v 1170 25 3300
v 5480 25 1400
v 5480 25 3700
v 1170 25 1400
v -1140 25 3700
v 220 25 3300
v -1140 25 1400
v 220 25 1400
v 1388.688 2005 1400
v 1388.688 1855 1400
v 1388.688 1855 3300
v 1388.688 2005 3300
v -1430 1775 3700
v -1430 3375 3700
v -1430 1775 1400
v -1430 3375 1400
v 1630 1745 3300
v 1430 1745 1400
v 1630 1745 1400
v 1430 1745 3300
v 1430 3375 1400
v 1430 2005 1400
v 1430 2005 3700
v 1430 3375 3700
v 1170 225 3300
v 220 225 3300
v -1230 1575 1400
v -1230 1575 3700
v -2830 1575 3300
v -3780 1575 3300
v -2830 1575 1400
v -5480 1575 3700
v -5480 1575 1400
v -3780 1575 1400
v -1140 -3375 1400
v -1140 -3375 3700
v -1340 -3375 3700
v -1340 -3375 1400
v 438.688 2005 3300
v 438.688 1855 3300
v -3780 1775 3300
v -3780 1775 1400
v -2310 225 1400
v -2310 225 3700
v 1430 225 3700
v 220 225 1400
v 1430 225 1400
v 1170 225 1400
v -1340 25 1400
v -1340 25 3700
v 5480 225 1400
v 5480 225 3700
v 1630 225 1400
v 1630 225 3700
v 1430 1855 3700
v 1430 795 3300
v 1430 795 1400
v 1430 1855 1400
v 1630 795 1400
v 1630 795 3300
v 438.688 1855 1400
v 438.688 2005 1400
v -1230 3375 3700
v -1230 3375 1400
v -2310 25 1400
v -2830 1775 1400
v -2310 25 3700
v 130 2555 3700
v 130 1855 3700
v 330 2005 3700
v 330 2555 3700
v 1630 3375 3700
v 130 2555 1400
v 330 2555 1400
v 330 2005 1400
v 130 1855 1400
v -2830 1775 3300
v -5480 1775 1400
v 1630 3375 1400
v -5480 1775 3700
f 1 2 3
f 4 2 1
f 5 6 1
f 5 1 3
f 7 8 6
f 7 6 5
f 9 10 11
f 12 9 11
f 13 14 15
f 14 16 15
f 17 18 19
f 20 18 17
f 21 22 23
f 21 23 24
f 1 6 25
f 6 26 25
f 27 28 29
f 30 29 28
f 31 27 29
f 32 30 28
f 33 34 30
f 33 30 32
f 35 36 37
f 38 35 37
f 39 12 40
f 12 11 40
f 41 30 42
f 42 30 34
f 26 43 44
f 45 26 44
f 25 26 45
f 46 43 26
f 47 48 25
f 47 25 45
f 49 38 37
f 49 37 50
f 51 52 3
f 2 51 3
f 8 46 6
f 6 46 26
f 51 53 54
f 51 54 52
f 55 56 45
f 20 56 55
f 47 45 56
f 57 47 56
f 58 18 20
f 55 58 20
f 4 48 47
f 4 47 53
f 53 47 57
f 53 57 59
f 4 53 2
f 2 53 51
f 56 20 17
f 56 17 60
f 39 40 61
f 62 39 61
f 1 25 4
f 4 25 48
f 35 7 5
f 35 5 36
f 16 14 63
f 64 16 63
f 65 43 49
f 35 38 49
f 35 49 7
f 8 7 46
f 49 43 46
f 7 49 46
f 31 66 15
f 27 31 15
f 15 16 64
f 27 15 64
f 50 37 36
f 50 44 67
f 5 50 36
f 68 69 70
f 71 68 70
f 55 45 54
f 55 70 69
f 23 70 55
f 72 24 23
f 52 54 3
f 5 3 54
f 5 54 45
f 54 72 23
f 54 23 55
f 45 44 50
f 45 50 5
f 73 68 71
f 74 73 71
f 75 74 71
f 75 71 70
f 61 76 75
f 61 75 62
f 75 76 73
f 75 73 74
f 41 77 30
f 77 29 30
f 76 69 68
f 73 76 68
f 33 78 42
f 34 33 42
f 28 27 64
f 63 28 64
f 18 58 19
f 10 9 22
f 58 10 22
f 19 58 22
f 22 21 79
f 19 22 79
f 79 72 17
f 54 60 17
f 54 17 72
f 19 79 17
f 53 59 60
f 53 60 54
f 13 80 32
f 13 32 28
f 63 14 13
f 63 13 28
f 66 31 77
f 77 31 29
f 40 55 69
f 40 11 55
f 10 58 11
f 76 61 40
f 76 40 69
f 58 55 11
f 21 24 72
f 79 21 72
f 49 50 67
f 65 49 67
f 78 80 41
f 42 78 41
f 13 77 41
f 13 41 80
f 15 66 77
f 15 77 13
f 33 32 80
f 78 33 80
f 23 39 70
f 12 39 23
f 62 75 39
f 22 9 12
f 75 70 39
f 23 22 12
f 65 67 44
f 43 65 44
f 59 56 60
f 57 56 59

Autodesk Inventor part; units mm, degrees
ref_plane "YZ Plane" through (0, 0, 0) normal (1, 0, 0) x (0, 1, 0)
ref_plane "XZ Plane" through (0, 0, 0) normal (0, 1, 0) x (-1, 0, 0)
ref_plane "Arbeitsebene1" through (0, 0, 1400) normal (0, 0, 1) x (1, 0, 0)
sketch "Skizze1" plane through (0, 0, 1400) normal (0, 0, 1) x (1, 0, 0)
  line L0 (5480, 3375) -> (5480, -3375) projected
  line L1 (5480, -3375) -> (-4000, -3375) projected
  line L2 (-4000, -3375) -> (-4000, -2075) projected
  line L3 (-4000, -2075) -> (-5480, -2075) projected
  line L4 (-5480, -2075) -> (-5480, 3375) projected
  line L5 (-5480, 3375) -> (5480, 3375) projected
  line L6 (-5480, -3575) -> (-5480, -2275) projected
  line L7 (-5480, -2275) -> (-4200, -2275) projected
  line L8 (-4200, -2275) -> (-4200, -3575) projected
  line L9 (-4200, -3575) -> (5680, -3575) projected
  line L10 (5680, -3575) -> (5680, 3575) projected
  line L11 (5680, 3575) -> (-5680, 3575) projected
  line L12 (-5680, 3575) -> (-5680, -3575) projected
  line L13 (-5680, -3575) -> (-5480, -3575) projected
  line L14 (-1140, -3375) -> (-1340, -3375)
  line L15 (-1340, -3375) -> (-1340, 25)
  line L16 (-1140, 25) -> (-1140, -3375)
  line L17 (-2310, 25) -> (-2310, 225)
  line L18 (5480, 225) -> (5480, 25)
  line L19 (-5480, 1775) -> (-1430, 1775)
  line L20 (-1230, 1575) -> (-5480, 1575)
  line L21 (-5480, 1575) -> (-5480, 1775)
  line L22 (-1230, 1575) -> (-1230, 3375)
  line L23 (-1430, 3375) -> (-1430, 1775)
  line L24 (1430, 3375) -> (1630, 3375)
  line L25 (1630, 3375) -> (1630, 225)
  line L26 (1430, 225) -> (1430, 3375)
  line L27 (5480, 25) -> (-1140, 25)
  line L28 (-1340, 25) -> (-2310, 25)
  line L29 (-2310, 225) -> (1430, 225)
  line L30 (1630, 225) -> (5480, 225)
  line L31 (-1430, 3375) -> (-1230, 3375)
  line L32 (1430, 1855) -> (130, 1855)
  line L33 (130, 1855) -> (130, 2555)
  line L34 (130, 2555) -> (330, 2555)
  line L35 (330, 2555) -> (330, 2005)
  line L36 (330, 2005) -> (1430, 2005)
  dimension "d0" = 6620
  dimension "d1" = 200
  dimension "d3" = 970
  dimension "d5" = 3850
  dimension "d6" = 3400
  dimension "d7" = 200
  dimension "d8" = 200
  dimension "d9" = 1600
  dimension "d10" = 200
  dimension "d11" = 200
  dimension "d12" = 4050
  dimension "d35" = 1630
  dimension "d36" = 200
  dimension "d37" = 150
  dimension "d38" = 700
  dimension "d40" = 1300
ref_plane "Arbeitsebene2" through (-5680, -3575, 3700) normal (0, 0, 1) x (1, 0, 0)
extrude "Extrusion1" add sketch "Skizze1" along normal up to surface (2300 mm away) contours L0 L27 L16 L1 L15 L28 L17 L29 L26 L5 L25 L30 | L22 L20 L4 L19 L23 L5 | L26 L32 L33 L34 L35 L36
sketch "Skizze2" plane through (-5480, 1575, 1400) normal (0, -1, 0) x (1, 0, 0)
  line L0 (4250, 2300) -> (0, 2300) projected
  line L1 (0, 0) -> (0, 2300) projected
  line L2 (0, 0) -> (4250, 0) projected
  line L3 (4250, 0) -> (4250, 2300) projected
  line L4 (4050, 0) -> (0, 0) projected
  line L5 (1700, 0) -> (2650, 0)
  line L6 (2650, 0) -> (2650, 1900)
  line L7 (2650, 1900) -> (1700, 1900)
  line L8 (1700, 1900) -> (1700, 0)
  dimension "d15" = 950
  dimension "d16" = 1600
  dimension "d17" = 1900
extrude "Extrusion2" cut sketch "Skizze2" against normal blind 879.25 contours L8 L7 L6 L2
sketch "Skizze3" plane through (1430, 225, 1400) normal (-1, 0, 0) x (0, 0, 1)
  line L0 (2300, 1780) -> (2300, 3150) projected
  line L1 (0, 3150) -> (2300, 3150) projected
  line L2 (0, 3150) -> (0, 1780) projected
  line L3 (0, 0) -> (2300, 0) projected
  line L4 (0, 1520) -> (1900, 1520)
  line L5 (1900, 1520) -> (1900, 570)
  line L6 (1900, 570) -> (0, 570)
  line L7 (0, 570) -> (0, 1520)
  line L8 (0, 1780) -> (2300, 1780) projected
  line L9 (0, 1630) -> (2300, 1630) projected
  line L10 (0, 1630) -> (0, 0) projected
  line L11 (2300, 0) -> (2300, 1630) projected
  dimension "d20" = 1900
  dimension "d21" = 950
  dimension "d41" = 570
extrude "Extrusion3" cut sketch "Skizze3" against normal blind 879.25 contours L7 L4 L5 L6
sketch "Skizze4" plane through (-2310, 225, 1400) normal (0, 1, 0) x (1, 0, 0)
  line L0 (0, -2300) -> (3740, -2300) projected
  line L1 (3740, 0) -> (3740, -2300) projected
  line L2 (3740, 0) -> (0, 0) projected
  line L3 (0, 0) -> (0, -2300) projected
  line L4 (3740, 0) -> (0, 0) projected
  line L5 (3480, 0) -> (2530, 0)
  line L6 (2530, 0) -> (2530, -1900)
  line L7 (2530, -1900) -> (3480, -1900)
  line L8 (3480, -1900) -> (3480, 0)
  line L9 (1170, 0) -> (1170, -2300) projected
  line L10 (1170, 0) -> (1170, -2300) projected
  dimension "d25" = 1900
  dimension "d26" = 950
  dimension "d30" = 1360
extrude "Extrusion4" cut sketch "Skizze4" against normal blind 879.25 contours L2 L8 L7 L6
sketch "Skizze5" plane through (130, 1855, 3700) normal (0, -1, 0) x (1, 0, 0)
  line L0 (1300, 0) -> (0, 0) projected
  line L1 (0, -2300) -> (0, 0) projected
  line L2 (0, -2300) -> (1300, -2300) projected
  line L3 (1300, -2300) -> (1300, 0) projected
  line L4 (0, -2300) -> (1300, -2300) projected
  line L5 (308.688, -2300) -> (1258.688, -2300)
  line L6 (1258.688, -2300) -> (1258.688, -400)
  line L7 (1258.688, -400) -> (308.688, -400)
  line L8 (308.688, -400) -> (308.688, -2300)
  dimension "d31" = 950
  dimension "d32" = 1900
extrude "Extrusion5" cut sketch "Skizze5" against normal up to surface (150 mm away) contours L2 L8 L7 L6
properties part number "Wände_unten"
